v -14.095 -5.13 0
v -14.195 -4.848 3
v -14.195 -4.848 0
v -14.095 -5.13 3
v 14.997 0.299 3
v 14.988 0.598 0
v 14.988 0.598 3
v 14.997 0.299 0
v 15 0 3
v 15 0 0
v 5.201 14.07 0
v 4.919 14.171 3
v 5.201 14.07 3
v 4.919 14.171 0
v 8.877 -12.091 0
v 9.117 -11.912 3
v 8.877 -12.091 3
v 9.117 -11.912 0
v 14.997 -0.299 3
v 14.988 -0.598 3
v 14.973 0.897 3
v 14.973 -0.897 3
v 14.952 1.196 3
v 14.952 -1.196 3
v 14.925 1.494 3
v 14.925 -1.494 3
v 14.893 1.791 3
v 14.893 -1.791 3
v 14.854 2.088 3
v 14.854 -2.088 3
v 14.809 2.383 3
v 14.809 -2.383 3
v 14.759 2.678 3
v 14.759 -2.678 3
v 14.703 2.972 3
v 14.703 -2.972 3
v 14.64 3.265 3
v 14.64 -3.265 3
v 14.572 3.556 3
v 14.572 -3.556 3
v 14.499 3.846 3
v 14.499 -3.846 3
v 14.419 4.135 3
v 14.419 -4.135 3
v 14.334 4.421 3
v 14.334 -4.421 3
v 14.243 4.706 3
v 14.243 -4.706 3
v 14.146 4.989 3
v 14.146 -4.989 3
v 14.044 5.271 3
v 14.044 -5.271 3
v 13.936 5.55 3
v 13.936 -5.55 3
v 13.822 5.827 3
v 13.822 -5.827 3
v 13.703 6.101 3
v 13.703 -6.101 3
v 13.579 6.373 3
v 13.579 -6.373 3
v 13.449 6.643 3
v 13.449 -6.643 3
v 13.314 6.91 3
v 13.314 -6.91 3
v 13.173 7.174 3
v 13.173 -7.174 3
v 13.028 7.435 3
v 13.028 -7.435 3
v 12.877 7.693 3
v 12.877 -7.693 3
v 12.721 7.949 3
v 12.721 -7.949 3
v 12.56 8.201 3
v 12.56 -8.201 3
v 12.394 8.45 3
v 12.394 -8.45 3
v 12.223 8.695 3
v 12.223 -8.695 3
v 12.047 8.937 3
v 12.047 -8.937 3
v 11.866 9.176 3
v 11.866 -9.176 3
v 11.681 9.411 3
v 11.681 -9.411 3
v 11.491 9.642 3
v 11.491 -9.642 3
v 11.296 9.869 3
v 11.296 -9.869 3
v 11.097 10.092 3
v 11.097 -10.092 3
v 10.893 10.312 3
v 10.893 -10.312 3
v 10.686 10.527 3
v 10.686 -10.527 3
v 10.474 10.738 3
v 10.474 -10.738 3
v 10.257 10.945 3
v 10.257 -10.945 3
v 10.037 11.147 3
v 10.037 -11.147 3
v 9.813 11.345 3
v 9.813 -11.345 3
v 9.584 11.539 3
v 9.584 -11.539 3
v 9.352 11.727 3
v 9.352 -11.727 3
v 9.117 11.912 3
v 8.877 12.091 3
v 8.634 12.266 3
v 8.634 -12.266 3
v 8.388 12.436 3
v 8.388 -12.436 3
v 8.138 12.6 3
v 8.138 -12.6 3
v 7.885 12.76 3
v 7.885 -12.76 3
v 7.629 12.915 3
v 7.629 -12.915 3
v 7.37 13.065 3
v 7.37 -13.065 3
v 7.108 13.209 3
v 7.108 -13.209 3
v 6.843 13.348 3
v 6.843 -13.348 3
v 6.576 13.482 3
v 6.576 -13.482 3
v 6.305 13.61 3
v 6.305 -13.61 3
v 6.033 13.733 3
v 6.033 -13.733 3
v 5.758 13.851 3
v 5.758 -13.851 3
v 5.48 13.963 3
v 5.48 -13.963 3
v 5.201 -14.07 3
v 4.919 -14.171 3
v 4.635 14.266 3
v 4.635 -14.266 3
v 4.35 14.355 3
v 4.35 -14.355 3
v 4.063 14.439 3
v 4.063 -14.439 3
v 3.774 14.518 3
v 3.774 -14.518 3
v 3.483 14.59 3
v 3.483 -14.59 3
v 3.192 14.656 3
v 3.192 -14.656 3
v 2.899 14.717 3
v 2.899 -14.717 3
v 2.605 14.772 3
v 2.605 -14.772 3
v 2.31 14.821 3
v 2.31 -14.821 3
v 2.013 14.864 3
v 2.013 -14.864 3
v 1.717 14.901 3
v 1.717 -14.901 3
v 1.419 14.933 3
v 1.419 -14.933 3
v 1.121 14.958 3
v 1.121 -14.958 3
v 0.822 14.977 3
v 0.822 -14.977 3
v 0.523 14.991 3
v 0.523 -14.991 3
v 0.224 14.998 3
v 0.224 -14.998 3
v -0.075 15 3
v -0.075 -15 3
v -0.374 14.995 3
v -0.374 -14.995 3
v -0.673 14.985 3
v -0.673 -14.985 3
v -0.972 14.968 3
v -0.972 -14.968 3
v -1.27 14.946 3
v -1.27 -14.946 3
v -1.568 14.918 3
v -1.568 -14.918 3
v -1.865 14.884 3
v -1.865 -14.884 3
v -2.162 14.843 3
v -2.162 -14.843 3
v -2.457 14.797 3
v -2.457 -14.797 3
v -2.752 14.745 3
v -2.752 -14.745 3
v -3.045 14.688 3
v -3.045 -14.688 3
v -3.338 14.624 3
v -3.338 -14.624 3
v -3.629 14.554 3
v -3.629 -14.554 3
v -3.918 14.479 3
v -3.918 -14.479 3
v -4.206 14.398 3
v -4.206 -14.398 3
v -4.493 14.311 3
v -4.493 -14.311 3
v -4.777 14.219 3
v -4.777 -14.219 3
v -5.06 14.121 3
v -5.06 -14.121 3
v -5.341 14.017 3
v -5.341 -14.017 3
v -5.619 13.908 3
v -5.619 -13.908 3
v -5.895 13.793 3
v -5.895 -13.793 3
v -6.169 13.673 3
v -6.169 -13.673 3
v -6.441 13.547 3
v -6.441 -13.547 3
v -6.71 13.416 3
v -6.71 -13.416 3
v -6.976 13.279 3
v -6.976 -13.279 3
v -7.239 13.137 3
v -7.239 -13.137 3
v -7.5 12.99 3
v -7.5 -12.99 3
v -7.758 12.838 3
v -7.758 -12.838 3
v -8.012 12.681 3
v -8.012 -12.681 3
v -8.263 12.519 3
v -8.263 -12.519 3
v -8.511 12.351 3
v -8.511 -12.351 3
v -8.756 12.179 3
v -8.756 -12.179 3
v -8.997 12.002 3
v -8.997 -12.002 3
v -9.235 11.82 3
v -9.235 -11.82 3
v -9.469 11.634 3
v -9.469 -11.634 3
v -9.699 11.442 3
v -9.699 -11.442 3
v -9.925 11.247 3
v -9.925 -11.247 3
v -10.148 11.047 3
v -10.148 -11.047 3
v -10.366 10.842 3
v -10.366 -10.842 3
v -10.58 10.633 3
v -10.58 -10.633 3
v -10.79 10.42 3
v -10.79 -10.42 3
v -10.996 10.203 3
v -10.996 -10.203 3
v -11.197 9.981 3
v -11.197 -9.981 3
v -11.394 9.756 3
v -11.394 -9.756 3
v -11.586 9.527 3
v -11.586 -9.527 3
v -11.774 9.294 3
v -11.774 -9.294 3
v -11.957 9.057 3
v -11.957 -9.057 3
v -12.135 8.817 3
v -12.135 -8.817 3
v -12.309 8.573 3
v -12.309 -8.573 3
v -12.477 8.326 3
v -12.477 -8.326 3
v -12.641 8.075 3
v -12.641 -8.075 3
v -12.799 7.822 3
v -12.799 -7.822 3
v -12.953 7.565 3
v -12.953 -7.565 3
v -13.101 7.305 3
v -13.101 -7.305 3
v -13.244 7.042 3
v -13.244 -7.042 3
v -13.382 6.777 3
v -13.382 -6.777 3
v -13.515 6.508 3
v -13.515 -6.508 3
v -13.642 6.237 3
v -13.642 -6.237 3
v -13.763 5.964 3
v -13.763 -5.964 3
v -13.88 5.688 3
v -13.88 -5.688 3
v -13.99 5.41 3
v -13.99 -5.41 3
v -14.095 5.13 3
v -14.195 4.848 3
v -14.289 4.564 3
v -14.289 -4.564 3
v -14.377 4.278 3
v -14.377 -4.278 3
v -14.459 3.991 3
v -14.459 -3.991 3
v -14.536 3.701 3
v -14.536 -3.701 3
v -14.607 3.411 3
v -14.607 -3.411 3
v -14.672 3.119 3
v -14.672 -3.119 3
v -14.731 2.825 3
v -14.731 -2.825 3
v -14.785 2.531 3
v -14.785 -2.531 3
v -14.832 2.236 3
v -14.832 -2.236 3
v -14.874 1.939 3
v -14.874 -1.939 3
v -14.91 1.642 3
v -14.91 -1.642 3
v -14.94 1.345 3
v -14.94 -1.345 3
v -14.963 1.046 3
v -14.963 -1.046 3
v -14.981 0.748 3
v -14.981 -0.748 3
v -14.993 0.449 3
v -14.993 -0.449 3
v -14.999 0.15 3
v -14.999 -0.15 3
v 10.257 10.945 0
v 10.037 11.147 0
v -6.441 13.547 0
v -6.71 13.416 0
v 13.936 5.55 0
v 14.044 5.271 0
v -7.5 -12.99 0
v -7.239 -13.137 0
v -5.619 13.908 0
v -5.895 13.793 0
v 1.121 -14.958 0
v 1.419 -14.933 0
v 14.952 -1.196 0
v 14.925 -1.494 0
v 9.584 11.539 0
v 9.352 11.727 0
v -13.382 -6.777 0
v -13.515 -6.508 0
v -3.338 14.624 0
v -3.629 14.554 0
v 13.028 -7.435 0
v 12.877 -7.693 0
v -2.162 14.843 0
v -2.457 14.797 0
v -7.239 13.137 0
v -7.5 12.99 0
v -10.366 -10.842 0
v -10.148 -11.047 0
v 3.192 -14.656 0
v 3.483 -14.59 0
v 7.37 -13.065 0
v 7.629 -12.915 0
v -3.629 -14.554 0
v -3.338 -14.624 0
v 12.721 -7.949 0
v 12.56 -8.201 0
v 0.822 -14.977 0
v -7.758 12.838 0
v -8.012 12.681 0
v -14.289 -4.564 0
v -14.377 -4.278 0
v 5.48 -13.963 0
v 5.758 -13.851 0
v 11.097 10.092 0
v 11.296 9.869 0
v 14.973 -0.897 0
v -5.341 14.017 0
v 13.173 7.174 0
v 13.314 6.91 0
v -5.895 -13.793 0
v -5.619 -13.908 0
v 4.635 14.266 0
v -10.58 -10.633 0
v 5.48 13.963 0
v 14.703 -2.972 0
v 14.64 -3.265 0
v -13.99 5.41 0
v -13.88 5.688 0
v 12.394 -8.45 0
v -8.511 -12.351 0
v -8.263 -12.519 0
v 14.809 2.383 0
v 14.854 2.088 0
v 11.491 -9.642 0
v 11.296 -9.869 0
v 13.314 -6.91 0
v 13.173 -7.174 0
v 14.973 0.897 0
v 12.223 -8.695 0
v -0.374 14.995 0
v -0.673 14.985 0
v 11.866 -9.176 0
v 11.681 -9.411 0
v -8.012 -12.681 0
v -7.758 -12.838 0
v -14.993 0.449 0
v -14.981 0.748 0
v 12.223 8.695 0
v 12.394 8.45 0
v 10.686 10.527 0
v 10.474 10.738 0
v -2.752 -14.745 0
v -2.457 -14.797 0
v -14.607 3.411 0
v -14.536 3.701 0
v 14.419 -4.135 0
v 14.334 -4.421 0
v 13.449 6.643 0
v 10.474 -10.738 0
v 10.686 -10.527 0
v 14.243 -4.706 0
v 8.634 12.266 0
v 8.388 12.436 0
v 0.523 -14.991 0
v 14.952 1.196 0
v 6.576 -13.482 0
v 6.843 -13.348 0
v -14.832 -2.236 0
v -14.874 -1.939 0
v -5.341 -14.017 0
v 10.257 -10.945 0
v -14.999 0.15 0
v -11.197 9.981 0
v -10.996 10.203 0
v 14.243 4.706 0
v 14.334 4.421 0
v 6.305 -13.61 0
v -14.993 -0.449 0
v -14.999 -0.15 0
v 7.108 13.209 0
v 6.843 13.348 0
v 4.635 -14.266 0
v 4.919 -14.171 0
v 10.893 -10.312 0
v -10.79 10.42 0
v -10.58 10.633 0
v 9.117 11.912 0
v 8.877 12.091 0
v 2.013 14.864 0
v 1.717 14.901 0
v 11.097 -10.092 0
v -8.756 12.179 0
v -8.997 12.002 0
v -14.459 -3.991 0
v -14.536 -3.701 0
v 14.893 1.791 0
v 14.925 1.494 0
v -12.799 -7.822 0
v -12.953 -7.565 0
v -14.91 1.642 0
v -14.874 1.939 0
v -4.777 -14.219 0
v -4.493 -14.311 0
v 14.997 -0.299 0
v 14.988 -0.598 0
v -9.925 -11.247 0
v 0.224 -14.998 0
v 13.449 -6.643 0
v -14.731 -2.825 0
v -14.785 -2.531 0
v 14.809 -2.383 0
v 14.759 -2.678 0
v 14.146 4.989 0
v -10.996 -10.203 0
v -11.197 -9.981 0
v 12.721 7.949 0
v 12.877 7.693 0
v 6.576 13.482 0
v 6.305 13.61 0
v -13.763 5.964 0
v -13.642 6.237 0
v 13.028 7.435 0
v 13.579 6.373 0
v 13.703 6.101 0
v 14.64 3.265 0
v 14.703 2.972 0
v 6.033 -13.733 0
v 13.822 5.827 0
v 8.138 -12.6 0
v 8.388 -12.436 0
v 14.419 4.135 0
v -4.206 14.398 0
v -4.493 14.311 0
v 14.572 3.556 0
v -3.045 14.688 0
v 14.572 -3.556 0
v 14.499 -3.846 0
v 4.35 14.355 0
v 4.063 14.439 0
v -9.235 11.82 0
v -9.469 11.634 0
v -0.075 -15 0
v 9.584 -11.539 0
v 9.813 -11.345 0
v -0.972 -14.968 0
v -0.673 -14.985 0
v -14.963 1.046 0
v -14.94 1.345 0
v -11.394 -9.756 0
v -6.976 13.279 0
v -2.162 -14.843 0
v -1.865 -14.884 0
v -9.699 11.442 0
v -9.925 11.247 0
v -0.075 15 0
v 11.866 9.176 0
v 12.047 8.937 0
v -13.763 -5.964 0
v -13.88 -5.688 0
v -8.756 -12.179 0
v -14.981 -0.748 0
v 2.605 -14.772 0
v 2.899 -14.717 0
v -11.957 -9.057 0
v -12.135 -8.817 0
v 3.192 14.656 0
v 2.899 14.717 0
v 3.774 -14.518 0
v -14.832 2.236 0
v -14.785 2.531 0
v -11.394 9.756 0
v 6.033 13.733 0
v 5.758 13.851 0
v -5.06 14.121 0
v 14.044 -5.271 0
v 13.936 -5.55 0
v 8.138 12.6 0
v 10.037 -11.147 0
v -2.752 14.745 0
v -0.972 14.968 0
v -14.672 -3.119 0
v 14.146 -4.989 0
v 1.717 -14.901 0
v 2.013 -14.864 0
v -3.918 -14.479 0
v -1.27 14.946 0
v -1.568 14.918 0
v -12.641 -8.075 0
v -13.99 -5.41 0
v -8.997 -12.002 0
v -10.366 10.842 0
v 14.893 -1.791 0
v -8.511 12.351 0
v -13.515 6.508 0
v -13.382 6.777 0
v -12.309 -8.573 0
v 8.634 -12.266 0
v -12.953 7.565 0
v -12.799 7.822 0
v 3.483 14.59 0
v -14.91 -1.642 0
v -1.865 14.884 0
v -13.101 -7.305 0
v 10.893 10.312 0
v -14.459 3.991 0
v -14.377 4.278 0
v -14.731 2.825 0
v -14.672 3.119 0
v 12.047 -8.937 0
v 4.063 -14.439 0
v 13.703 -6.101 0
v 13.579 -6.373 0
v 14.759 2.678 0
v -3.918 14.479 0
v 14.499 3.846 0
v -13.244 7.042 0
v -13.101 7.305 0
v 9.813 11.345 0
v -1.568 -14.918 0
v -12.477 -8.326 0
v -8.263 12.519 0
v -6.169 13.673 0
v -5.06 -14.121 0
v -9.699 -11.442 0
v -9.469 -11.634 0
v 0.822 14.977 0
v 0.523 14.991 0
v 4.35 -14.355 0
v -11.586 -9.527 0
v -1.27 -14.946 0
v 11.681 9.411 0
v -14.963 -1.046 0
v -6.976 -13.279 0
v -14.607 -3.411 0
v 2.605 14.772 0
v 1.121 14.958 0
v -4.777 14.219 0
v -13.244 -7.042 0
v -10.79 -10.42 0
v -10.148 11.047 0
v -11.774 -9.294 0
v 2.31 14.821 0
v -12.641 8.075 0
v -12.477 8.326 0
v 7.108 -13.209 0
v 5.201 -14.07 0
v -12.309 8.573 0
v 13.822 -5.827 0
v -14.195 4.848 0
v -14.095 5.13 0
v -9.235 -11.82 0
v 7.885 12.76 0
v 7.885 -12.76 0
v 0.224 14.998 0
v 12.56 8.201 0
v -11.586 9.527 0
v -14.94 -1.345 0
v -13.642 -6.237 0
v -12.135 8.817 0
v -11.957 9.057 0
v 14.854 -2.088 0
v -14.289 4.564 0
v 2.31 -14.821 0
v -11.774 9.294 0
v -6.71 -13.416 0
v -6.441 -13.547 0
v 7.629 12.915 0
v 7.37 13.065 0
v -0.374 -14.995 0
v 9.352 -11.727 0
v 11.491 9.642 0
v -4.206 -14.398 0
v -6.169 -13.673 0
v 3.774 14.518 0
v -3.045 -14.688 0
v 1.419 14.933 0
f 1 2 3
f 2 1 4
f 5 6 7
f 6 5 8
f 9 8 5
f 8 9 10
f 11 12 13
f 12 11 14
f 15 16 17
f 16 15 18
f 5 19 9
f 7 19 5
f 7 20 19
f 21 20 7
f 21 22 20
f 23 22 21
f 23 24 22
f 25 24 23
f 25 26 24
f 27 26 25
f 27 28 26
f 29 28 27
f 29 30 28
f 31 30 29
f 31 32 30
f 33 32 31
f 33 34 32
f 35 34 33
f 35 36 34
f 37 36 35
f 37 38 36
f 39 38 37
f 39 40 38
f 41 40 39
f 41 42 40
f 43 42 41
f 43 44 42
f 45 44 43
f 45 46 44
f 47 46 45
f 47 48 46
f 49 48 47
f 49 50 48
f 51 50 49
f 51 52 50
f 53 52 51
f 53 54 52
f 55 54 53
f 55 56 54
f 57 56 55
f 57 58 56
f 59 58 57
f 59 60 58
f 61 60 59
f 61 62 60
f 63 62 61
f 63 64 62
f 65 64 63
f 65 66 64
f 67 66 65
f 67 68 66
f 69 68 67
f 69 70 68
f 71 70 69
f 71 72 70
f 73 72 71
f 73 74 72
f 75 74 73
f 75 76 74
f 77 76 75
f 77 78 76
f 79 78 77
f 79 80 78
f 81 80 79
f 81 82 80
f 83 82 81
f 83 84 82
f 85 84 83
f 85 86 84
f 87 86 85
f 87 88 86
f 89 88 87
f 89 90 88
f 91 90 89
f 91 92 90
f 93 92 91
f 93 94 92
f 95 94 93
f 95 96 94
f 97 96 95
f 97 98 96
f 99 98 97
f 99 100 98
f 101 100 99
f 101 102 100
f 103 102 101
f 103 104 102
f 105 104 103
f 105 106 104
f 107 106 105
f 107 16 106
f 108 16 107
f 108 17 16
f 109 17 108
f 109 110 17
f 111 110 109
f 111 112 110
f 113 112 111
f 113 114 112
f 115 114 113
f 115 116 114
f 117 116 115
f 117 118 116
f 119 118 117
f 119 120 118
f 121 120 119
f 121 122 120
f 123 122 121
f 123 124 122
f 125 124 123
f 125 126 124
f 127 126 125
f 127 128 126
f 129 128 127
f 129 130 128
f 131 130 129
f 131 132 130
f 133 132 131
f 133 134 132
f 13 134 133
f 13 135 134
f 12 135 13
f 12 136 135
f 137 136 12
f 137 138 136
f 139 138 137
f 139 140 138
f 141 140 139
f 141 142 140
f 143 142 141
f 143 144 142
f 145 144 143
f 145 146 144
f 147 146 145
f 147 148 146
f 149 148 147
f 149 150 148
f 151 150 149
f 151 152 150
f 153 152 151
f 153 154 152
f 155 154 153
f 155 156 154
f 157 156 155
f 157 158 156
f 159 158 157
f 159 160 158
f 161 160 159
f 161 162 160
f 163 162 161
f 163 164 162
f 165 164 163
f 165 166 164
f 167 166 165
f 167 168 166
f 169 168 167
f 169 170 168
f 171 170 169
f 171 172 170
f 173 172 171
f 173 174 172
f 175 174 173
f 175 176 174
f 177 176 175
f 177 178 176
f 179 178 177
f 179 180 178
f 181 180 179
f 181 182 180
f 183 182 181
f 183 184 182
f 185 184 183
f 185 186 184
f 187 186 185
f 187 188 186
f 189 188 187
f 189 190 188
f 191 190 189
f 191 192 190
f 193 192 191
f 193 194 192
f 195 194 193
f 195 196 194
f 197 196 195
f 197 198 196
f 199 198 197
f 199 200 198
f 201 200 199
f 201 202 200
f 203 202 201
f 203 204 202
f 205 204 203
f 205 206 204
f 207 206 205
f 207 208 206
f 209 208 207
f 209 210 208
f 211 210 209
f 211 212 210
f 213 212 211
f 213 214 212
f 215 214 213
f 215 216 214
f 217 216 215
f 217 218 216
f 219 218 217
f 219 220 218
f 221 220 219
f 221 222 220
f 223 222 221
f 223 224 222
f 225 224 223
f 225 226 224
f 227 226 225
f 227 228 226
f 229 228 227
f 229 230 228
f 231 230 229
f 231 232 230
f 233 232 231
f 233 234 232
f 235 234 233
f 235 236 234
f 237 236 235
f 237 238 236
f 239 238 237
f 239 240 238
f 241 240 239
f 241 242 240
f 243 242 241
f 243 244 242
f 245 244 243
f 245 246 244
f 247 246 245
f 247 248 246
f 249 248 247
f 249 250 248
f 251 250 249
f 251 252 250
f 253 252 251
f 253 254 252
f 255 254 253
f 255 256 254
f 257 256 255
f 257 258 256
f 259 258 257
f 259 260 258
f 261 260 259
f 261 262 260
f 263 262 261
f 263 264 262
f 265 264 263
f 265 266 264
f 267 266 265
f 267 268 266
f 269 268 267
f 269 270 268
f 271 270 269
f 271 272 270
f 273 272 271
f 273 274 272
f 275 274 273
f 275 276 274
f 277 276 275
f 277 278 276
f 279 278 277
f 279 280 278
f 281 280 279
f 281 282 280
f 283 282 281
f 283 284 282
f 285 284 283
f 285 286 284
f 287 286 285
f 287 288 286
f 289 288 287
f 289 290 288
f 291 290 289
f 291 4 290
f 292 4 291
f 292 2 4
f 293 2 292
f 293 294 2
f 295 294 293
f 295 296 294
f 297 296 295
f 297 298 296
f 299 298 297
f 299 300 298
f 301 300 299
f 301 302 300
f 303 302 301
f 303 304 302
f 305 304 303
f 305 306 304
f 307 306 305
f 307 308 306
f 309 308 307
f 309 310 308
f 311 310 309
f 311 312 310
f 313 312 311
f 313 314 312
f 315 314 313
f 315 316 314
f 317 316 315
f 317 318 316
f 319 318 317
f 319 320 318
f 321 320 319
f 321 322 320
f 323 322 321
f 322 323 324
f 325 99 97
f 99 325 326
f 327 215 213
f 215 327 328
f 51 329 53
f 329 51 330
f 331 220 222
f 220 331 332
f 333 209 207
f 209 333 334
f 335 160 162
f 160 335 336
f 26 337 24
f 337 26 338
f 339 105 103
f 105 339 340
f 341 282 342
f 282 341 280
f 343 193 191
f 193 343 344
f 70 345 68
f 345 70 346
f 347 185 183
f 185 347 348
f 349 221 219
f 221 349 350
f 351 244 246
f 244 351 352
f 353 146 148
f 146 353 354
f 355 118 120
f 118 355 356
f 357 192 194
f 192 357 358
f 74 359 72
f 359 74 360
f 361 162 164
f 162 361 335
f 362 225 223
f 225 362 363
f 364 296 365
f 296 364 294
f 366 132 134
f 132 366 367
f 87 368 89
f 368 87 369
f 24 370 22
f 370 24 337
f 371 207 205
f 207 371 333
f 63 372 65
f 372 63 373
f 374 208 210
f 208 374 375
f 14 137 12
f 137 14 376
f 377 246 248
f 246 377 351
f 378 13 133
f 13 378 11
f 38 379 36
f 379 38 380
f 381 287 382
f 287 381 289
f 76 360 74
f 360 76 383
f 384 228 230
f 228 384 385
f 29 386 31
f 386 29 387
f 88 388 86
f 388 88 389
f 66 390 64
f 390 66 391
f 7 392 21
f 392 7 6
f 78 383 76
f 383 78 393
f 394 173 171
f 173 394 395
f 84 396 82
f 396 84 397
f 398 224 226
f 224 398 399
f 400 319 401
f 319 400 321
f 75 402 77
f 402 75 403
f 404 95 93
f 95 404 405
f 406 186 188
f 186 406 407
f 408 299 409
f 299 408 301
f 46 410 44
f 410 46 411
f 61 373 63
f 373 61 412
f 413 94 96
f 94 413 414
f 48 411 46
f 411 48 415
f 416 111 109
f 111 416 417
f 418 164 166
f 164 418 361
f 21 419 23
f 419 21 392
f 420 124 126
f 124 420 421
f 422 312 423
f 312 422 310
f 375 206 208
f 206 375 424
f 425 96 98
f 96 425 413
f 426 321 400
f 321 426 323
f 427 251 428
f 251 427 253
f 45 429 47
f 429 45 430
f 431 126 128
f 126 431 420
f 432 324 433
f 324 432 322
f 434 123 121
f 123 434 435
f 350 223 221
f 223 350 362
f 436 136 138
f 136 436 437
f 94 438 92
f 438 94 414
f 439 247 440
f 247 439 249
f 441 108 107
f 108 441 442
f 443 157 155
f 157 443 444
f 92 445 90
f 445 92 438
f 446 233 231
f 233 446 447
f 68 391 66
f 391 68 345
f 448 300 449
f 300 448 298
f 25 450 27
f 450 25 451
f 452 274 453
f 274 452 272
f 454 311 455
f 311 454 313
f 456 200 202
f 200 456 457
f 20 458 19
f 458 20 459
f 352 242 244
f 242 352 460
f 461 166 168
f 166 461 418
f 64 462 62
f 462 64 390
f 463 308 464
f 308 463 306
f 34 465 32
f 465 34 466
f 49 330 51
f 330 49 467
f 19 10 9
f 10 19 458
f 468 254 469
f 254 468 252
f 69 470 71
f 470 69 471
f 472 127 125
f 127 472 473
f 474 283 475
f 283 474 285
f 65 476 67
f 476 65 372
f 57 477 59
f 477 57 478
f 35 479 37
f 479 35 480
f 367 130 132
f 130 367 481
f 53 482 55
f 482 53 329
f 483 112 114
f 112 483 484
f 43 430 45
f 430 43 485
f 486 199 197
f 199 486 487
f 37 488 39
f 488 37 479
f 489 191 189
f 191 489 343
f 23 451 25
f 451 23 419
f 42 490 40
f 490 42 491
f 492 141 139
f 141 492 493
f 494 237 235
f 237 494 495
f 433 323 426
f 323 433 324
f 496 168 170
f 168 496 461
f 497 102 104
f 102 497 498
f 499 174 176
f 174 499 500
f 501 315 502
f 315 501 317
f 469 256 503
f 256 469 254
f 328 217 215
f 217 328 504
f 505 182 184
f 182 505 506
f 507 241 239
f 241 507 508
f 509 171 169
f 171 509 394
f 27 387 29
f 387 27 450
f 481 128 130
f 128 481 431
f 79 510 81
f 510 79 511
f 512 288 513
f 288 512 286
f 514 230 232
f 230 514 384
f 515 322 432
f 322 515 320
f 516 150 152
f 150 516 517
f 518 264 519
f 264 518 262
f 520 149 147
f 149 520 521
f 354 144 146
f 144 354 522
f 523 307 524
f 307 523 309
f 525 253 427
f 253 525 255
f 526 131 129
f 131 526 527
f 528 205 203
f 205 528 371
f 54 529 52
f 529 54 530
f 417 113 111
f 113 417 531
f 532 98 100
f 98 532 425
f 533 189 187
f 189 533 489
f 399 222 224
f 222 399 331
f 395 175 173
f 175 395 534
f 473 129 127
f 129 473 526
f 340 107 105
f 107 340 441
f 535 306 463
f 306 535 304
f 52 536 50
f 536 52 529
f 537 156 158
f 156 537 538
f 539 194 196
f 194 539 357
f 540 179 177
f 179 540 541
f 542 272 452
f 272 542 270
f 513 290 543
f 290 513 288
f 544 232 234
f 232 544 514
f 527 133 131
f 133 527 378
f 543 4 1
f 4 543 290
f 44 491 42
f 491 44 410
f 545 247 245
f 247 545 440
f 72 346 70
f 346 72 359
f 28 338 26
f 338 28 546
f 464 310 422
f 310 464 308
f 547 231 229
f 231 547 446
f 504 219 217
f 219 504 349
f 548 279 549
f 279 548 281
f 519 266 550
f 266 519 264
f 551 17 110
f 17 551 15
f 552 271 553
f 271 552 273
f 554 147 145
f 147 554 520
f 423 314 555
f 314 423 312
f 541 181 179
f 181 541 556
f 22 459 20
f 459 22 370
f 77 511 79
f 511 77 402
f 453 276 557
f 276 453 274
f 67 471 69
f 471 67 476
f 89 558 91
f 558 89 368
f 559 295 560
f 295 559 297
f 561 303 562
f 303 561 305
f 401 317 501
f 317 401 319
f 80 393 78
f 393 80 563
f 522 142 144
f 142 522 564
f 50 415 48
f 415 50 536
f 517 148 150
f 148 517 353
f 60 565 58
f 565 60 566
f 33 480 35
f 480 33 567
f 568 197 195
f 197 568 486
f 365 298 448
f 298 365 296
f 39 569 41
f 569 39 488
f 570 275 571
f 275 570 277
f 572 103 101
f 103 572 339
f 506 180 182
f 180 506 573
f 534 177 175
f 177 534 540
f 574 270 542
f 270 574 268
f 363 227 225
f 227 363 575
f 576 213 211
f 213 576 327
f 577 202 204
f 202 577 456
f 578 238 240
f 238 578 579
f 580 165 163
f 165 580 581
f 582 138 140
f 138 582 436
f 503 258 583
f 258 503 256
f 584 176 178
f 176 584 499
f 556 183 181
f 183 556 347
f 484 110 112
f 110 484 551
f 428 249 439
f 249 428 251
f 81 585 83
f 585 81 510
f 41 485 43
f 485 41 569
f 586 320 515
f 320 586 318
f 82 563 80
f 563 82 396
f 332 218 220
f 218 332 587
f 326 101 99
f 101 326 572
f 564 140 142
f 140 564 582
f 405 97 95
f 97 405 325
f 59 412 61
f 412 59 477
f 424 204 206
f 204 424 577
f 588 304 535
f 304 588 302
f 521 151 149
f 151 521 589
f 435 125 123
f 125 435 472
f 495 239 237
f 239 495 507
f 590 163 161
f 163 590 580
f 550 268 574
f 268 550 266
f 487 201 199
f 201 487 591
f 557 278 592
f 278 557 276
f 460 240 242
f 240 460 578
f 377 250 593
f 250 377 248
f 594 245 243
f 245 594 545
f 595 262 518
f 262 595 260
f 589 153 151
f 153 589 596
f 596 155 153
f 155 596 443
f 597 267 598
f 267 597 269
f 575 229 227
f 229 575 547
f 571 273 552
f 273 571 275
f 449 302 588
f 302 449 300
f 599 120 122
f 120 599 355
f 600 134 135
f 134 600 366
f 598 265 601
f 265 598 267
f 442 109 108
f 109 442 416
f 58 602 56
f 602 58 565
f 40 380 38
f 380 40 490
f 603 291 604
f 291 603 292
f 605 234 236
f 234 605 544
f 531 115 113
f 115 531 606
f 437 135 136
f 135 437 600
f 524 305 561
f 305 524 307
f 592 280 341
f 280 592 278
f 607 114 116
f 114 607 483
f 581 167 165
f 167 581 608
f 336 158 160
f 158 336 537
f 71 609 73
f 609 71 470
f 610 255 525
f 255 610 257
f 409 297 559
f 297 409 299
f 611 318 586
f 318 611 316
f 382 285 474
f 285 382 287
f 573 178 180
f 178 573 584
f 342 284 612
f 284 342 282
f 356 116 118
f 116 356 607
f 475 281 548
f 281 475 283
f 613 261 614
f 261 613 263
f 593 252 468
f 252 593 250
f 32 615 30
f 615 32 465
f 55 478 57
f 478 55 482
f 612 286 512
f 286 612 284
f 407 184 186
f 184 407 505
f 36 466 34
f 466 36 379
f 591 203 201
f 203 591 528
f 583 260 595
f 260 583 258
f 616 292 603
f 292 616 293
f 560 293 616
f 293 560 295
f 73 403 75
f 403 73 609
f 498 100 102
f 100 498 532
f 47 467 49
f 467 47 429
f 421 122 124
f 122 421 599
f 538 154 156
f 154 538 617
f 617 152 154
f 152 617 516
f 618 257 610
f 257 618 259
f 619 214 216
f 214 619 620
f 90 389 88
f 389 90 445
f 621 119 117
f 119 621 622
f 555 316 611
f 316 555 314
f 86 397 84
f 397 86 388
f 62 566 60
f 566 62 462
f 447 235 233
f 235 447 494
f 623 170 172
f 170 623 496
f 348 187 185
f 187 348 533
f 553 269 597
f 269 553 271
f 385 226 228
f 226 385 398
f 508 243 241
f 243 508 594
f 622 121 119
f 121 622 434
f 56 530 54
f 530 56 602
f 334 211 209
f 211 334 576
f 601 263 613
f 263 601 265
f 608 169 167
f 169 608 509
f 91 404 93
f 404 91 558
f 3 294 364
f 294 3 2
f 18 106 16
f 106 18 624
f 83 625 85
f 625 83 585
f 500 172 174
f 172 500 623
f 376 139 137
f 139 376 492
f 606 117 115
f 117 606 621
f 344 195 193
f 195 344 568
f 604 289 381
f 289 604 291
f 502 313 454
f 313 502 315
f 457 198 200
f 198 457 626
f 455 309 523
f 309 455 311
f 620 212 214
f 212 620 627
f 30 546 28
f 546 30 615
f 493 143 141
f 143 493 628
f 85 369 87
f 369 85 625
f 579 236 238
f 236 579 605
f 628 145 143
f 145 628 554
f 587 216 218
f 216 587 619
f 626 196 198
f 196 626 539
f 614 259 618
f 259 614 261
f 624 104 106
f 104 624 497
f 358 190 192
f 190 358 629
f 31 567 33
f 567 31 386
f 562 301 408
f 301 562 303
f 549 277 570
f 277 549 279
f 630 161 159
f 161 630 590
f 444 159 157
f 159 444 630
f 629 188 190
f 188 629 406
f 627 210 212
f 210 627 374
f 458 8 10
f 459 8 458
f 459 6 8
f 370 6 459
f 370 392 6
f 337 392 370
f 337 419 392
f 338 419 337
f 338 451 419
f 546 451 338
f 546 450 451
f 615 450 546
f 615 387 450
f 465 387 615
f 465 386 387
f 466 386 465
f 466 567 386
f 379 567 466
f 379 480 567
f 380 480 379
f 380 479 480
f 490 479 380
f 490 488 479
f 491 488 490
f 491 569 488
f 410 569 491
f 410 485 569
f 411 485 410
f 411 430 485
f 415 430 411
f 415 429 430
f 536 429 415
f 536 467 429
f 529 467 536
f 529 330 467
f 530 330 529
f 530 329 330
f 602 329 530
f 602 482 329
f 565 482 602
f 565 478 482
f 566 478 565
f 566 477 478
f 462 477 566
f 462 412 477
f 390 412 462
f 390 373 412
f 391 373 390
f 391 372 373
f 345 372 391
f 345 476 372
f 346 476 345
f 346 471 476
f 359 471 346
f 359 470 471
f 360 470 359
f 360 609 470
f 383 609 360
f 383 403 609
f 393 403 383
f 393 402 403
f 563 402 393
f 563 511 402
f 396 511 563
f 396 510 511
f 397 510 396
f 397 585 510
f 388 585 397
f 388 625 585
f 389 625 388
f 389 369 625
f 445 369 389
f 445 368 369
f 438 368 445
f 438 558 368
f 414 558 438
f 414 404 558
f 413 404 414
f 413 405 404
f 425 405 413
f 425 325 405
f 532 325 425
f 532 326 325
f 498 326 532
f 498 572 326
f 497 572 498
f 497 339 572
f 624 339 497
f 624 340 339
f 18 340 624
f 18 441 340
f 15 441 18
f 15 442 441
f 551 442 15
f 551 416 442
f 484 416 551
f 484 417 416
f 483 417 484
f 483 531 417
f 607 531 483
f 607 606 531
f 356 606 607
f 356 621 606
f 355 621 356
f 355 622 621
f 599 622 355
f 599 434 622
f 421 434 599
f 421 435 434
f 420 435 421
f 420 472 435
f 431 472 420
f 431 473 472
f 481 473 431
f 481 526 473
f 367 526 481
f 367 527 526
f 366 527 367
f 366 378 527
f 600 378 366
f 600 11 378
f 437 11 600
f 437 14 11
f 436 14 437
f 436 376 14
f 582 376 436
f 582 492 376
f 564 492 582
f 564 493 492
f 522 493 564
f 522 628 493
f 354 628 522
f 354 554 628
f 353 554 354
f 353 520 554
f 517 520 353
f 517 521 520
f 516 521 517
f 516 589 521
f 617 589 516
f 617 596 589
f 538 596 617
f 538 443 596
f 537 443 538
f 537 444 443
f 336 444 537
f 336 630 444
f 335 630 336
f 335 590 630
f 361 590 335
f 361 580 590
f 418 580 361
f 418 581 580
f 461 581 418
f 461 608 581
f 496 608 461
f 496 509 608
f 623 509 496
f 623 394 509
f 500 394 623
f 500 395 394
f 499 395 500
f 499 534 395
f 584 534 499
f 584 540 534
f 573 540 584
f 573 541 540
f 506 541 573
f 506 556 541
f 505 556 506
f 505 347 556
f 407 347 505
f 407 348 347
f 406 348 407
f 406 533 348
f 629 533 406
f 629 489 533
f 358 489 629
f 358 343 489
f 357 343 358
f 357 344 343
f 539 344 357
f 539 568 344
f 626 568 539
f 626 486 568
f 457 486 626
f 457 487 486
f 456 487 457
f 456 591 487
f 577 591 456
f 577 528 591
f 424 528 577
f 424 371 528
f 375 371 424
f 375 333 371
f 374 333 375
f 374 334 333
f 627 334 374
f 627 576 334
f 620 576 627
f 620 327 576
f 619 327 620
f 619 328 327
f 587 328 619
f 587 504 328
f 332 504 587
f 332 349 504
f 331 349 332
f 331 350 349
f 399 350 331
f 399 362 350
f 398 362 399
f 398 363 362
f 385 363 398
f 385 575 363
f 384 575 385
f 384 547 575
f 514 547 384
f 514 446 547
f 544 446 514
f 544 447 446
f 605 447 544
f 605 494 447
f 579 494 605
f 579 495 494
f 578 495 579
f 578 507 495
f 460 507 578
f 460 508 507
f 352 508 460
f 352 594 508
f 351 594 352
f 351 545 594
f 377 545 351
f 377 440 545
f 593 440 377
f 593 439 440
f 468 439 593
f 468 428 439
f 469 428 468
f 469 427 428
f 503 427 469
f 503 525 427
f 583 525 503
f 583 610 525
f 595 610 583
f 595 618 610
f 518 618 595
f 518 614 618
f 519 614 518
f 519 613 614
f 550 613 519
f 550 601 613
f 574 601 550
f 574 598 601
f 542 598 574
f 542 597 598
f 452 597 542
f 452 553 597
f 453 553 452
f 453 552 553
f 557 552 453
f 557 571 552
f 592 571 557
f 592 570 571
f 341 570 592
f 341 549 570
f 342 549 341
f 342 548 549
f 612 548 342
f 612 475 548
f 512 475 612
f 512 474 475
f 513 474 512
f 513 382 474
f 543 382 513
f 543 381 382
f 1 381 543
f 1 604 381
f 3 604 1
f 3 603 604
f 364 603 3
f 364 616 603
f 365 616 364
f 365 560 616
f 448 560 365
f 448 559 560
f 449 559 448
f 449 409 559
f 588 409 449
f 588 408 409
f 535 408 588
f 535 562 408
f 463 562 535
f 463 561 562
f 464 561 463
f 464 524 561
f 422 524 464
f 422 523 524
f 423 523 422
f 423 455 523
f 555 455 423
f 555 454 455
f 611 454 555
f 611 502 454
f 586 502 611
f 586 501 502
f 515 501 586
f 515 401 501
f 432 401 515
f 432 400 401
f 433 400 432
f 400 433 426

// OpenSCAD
//-----------------------------------------------------------------------------
// Nelson Neves: nelson.s.neves@gmail.com
//-----------------------------------------------------------------------------
// disable $fn and $fa, do not change these
$fn=0;
$fa = 0.01;
// use $fs to control the number of facets globally // fine ~ 0.1 coarse ~ 1.0
$fs = 0.3;
//-----------------------------------------------------------------------------

module openHardware_extrude(oHeight){
	scale(v = [1.0, 1.0, 1.0]) {
		translate([-78.9,-71.2+5])
     		linear_extrude(height = oHeight) import("openhardwarefinal0_petit.dxf");

	}
}
//-----------------------------------------------------------------------------
module openHardware_intrude(oHeight){
	scale(v = [1.0, 1.0, 1.0]) {
		translate([-80, -76.6+11]) 
    		  linear_extrude(height = oHeight) import("openhardwarefinal0_grossi.dxf");
	}
}

difference(){
	cylinder(r=15, h=3);	
	translate([0,0,1])scale([0.15,0.15,1.0]) openHardware_intrude(3);
}

translate([30,0,0])
	scale([0.15,0.15,1.0])openHardware_extrude(3);
